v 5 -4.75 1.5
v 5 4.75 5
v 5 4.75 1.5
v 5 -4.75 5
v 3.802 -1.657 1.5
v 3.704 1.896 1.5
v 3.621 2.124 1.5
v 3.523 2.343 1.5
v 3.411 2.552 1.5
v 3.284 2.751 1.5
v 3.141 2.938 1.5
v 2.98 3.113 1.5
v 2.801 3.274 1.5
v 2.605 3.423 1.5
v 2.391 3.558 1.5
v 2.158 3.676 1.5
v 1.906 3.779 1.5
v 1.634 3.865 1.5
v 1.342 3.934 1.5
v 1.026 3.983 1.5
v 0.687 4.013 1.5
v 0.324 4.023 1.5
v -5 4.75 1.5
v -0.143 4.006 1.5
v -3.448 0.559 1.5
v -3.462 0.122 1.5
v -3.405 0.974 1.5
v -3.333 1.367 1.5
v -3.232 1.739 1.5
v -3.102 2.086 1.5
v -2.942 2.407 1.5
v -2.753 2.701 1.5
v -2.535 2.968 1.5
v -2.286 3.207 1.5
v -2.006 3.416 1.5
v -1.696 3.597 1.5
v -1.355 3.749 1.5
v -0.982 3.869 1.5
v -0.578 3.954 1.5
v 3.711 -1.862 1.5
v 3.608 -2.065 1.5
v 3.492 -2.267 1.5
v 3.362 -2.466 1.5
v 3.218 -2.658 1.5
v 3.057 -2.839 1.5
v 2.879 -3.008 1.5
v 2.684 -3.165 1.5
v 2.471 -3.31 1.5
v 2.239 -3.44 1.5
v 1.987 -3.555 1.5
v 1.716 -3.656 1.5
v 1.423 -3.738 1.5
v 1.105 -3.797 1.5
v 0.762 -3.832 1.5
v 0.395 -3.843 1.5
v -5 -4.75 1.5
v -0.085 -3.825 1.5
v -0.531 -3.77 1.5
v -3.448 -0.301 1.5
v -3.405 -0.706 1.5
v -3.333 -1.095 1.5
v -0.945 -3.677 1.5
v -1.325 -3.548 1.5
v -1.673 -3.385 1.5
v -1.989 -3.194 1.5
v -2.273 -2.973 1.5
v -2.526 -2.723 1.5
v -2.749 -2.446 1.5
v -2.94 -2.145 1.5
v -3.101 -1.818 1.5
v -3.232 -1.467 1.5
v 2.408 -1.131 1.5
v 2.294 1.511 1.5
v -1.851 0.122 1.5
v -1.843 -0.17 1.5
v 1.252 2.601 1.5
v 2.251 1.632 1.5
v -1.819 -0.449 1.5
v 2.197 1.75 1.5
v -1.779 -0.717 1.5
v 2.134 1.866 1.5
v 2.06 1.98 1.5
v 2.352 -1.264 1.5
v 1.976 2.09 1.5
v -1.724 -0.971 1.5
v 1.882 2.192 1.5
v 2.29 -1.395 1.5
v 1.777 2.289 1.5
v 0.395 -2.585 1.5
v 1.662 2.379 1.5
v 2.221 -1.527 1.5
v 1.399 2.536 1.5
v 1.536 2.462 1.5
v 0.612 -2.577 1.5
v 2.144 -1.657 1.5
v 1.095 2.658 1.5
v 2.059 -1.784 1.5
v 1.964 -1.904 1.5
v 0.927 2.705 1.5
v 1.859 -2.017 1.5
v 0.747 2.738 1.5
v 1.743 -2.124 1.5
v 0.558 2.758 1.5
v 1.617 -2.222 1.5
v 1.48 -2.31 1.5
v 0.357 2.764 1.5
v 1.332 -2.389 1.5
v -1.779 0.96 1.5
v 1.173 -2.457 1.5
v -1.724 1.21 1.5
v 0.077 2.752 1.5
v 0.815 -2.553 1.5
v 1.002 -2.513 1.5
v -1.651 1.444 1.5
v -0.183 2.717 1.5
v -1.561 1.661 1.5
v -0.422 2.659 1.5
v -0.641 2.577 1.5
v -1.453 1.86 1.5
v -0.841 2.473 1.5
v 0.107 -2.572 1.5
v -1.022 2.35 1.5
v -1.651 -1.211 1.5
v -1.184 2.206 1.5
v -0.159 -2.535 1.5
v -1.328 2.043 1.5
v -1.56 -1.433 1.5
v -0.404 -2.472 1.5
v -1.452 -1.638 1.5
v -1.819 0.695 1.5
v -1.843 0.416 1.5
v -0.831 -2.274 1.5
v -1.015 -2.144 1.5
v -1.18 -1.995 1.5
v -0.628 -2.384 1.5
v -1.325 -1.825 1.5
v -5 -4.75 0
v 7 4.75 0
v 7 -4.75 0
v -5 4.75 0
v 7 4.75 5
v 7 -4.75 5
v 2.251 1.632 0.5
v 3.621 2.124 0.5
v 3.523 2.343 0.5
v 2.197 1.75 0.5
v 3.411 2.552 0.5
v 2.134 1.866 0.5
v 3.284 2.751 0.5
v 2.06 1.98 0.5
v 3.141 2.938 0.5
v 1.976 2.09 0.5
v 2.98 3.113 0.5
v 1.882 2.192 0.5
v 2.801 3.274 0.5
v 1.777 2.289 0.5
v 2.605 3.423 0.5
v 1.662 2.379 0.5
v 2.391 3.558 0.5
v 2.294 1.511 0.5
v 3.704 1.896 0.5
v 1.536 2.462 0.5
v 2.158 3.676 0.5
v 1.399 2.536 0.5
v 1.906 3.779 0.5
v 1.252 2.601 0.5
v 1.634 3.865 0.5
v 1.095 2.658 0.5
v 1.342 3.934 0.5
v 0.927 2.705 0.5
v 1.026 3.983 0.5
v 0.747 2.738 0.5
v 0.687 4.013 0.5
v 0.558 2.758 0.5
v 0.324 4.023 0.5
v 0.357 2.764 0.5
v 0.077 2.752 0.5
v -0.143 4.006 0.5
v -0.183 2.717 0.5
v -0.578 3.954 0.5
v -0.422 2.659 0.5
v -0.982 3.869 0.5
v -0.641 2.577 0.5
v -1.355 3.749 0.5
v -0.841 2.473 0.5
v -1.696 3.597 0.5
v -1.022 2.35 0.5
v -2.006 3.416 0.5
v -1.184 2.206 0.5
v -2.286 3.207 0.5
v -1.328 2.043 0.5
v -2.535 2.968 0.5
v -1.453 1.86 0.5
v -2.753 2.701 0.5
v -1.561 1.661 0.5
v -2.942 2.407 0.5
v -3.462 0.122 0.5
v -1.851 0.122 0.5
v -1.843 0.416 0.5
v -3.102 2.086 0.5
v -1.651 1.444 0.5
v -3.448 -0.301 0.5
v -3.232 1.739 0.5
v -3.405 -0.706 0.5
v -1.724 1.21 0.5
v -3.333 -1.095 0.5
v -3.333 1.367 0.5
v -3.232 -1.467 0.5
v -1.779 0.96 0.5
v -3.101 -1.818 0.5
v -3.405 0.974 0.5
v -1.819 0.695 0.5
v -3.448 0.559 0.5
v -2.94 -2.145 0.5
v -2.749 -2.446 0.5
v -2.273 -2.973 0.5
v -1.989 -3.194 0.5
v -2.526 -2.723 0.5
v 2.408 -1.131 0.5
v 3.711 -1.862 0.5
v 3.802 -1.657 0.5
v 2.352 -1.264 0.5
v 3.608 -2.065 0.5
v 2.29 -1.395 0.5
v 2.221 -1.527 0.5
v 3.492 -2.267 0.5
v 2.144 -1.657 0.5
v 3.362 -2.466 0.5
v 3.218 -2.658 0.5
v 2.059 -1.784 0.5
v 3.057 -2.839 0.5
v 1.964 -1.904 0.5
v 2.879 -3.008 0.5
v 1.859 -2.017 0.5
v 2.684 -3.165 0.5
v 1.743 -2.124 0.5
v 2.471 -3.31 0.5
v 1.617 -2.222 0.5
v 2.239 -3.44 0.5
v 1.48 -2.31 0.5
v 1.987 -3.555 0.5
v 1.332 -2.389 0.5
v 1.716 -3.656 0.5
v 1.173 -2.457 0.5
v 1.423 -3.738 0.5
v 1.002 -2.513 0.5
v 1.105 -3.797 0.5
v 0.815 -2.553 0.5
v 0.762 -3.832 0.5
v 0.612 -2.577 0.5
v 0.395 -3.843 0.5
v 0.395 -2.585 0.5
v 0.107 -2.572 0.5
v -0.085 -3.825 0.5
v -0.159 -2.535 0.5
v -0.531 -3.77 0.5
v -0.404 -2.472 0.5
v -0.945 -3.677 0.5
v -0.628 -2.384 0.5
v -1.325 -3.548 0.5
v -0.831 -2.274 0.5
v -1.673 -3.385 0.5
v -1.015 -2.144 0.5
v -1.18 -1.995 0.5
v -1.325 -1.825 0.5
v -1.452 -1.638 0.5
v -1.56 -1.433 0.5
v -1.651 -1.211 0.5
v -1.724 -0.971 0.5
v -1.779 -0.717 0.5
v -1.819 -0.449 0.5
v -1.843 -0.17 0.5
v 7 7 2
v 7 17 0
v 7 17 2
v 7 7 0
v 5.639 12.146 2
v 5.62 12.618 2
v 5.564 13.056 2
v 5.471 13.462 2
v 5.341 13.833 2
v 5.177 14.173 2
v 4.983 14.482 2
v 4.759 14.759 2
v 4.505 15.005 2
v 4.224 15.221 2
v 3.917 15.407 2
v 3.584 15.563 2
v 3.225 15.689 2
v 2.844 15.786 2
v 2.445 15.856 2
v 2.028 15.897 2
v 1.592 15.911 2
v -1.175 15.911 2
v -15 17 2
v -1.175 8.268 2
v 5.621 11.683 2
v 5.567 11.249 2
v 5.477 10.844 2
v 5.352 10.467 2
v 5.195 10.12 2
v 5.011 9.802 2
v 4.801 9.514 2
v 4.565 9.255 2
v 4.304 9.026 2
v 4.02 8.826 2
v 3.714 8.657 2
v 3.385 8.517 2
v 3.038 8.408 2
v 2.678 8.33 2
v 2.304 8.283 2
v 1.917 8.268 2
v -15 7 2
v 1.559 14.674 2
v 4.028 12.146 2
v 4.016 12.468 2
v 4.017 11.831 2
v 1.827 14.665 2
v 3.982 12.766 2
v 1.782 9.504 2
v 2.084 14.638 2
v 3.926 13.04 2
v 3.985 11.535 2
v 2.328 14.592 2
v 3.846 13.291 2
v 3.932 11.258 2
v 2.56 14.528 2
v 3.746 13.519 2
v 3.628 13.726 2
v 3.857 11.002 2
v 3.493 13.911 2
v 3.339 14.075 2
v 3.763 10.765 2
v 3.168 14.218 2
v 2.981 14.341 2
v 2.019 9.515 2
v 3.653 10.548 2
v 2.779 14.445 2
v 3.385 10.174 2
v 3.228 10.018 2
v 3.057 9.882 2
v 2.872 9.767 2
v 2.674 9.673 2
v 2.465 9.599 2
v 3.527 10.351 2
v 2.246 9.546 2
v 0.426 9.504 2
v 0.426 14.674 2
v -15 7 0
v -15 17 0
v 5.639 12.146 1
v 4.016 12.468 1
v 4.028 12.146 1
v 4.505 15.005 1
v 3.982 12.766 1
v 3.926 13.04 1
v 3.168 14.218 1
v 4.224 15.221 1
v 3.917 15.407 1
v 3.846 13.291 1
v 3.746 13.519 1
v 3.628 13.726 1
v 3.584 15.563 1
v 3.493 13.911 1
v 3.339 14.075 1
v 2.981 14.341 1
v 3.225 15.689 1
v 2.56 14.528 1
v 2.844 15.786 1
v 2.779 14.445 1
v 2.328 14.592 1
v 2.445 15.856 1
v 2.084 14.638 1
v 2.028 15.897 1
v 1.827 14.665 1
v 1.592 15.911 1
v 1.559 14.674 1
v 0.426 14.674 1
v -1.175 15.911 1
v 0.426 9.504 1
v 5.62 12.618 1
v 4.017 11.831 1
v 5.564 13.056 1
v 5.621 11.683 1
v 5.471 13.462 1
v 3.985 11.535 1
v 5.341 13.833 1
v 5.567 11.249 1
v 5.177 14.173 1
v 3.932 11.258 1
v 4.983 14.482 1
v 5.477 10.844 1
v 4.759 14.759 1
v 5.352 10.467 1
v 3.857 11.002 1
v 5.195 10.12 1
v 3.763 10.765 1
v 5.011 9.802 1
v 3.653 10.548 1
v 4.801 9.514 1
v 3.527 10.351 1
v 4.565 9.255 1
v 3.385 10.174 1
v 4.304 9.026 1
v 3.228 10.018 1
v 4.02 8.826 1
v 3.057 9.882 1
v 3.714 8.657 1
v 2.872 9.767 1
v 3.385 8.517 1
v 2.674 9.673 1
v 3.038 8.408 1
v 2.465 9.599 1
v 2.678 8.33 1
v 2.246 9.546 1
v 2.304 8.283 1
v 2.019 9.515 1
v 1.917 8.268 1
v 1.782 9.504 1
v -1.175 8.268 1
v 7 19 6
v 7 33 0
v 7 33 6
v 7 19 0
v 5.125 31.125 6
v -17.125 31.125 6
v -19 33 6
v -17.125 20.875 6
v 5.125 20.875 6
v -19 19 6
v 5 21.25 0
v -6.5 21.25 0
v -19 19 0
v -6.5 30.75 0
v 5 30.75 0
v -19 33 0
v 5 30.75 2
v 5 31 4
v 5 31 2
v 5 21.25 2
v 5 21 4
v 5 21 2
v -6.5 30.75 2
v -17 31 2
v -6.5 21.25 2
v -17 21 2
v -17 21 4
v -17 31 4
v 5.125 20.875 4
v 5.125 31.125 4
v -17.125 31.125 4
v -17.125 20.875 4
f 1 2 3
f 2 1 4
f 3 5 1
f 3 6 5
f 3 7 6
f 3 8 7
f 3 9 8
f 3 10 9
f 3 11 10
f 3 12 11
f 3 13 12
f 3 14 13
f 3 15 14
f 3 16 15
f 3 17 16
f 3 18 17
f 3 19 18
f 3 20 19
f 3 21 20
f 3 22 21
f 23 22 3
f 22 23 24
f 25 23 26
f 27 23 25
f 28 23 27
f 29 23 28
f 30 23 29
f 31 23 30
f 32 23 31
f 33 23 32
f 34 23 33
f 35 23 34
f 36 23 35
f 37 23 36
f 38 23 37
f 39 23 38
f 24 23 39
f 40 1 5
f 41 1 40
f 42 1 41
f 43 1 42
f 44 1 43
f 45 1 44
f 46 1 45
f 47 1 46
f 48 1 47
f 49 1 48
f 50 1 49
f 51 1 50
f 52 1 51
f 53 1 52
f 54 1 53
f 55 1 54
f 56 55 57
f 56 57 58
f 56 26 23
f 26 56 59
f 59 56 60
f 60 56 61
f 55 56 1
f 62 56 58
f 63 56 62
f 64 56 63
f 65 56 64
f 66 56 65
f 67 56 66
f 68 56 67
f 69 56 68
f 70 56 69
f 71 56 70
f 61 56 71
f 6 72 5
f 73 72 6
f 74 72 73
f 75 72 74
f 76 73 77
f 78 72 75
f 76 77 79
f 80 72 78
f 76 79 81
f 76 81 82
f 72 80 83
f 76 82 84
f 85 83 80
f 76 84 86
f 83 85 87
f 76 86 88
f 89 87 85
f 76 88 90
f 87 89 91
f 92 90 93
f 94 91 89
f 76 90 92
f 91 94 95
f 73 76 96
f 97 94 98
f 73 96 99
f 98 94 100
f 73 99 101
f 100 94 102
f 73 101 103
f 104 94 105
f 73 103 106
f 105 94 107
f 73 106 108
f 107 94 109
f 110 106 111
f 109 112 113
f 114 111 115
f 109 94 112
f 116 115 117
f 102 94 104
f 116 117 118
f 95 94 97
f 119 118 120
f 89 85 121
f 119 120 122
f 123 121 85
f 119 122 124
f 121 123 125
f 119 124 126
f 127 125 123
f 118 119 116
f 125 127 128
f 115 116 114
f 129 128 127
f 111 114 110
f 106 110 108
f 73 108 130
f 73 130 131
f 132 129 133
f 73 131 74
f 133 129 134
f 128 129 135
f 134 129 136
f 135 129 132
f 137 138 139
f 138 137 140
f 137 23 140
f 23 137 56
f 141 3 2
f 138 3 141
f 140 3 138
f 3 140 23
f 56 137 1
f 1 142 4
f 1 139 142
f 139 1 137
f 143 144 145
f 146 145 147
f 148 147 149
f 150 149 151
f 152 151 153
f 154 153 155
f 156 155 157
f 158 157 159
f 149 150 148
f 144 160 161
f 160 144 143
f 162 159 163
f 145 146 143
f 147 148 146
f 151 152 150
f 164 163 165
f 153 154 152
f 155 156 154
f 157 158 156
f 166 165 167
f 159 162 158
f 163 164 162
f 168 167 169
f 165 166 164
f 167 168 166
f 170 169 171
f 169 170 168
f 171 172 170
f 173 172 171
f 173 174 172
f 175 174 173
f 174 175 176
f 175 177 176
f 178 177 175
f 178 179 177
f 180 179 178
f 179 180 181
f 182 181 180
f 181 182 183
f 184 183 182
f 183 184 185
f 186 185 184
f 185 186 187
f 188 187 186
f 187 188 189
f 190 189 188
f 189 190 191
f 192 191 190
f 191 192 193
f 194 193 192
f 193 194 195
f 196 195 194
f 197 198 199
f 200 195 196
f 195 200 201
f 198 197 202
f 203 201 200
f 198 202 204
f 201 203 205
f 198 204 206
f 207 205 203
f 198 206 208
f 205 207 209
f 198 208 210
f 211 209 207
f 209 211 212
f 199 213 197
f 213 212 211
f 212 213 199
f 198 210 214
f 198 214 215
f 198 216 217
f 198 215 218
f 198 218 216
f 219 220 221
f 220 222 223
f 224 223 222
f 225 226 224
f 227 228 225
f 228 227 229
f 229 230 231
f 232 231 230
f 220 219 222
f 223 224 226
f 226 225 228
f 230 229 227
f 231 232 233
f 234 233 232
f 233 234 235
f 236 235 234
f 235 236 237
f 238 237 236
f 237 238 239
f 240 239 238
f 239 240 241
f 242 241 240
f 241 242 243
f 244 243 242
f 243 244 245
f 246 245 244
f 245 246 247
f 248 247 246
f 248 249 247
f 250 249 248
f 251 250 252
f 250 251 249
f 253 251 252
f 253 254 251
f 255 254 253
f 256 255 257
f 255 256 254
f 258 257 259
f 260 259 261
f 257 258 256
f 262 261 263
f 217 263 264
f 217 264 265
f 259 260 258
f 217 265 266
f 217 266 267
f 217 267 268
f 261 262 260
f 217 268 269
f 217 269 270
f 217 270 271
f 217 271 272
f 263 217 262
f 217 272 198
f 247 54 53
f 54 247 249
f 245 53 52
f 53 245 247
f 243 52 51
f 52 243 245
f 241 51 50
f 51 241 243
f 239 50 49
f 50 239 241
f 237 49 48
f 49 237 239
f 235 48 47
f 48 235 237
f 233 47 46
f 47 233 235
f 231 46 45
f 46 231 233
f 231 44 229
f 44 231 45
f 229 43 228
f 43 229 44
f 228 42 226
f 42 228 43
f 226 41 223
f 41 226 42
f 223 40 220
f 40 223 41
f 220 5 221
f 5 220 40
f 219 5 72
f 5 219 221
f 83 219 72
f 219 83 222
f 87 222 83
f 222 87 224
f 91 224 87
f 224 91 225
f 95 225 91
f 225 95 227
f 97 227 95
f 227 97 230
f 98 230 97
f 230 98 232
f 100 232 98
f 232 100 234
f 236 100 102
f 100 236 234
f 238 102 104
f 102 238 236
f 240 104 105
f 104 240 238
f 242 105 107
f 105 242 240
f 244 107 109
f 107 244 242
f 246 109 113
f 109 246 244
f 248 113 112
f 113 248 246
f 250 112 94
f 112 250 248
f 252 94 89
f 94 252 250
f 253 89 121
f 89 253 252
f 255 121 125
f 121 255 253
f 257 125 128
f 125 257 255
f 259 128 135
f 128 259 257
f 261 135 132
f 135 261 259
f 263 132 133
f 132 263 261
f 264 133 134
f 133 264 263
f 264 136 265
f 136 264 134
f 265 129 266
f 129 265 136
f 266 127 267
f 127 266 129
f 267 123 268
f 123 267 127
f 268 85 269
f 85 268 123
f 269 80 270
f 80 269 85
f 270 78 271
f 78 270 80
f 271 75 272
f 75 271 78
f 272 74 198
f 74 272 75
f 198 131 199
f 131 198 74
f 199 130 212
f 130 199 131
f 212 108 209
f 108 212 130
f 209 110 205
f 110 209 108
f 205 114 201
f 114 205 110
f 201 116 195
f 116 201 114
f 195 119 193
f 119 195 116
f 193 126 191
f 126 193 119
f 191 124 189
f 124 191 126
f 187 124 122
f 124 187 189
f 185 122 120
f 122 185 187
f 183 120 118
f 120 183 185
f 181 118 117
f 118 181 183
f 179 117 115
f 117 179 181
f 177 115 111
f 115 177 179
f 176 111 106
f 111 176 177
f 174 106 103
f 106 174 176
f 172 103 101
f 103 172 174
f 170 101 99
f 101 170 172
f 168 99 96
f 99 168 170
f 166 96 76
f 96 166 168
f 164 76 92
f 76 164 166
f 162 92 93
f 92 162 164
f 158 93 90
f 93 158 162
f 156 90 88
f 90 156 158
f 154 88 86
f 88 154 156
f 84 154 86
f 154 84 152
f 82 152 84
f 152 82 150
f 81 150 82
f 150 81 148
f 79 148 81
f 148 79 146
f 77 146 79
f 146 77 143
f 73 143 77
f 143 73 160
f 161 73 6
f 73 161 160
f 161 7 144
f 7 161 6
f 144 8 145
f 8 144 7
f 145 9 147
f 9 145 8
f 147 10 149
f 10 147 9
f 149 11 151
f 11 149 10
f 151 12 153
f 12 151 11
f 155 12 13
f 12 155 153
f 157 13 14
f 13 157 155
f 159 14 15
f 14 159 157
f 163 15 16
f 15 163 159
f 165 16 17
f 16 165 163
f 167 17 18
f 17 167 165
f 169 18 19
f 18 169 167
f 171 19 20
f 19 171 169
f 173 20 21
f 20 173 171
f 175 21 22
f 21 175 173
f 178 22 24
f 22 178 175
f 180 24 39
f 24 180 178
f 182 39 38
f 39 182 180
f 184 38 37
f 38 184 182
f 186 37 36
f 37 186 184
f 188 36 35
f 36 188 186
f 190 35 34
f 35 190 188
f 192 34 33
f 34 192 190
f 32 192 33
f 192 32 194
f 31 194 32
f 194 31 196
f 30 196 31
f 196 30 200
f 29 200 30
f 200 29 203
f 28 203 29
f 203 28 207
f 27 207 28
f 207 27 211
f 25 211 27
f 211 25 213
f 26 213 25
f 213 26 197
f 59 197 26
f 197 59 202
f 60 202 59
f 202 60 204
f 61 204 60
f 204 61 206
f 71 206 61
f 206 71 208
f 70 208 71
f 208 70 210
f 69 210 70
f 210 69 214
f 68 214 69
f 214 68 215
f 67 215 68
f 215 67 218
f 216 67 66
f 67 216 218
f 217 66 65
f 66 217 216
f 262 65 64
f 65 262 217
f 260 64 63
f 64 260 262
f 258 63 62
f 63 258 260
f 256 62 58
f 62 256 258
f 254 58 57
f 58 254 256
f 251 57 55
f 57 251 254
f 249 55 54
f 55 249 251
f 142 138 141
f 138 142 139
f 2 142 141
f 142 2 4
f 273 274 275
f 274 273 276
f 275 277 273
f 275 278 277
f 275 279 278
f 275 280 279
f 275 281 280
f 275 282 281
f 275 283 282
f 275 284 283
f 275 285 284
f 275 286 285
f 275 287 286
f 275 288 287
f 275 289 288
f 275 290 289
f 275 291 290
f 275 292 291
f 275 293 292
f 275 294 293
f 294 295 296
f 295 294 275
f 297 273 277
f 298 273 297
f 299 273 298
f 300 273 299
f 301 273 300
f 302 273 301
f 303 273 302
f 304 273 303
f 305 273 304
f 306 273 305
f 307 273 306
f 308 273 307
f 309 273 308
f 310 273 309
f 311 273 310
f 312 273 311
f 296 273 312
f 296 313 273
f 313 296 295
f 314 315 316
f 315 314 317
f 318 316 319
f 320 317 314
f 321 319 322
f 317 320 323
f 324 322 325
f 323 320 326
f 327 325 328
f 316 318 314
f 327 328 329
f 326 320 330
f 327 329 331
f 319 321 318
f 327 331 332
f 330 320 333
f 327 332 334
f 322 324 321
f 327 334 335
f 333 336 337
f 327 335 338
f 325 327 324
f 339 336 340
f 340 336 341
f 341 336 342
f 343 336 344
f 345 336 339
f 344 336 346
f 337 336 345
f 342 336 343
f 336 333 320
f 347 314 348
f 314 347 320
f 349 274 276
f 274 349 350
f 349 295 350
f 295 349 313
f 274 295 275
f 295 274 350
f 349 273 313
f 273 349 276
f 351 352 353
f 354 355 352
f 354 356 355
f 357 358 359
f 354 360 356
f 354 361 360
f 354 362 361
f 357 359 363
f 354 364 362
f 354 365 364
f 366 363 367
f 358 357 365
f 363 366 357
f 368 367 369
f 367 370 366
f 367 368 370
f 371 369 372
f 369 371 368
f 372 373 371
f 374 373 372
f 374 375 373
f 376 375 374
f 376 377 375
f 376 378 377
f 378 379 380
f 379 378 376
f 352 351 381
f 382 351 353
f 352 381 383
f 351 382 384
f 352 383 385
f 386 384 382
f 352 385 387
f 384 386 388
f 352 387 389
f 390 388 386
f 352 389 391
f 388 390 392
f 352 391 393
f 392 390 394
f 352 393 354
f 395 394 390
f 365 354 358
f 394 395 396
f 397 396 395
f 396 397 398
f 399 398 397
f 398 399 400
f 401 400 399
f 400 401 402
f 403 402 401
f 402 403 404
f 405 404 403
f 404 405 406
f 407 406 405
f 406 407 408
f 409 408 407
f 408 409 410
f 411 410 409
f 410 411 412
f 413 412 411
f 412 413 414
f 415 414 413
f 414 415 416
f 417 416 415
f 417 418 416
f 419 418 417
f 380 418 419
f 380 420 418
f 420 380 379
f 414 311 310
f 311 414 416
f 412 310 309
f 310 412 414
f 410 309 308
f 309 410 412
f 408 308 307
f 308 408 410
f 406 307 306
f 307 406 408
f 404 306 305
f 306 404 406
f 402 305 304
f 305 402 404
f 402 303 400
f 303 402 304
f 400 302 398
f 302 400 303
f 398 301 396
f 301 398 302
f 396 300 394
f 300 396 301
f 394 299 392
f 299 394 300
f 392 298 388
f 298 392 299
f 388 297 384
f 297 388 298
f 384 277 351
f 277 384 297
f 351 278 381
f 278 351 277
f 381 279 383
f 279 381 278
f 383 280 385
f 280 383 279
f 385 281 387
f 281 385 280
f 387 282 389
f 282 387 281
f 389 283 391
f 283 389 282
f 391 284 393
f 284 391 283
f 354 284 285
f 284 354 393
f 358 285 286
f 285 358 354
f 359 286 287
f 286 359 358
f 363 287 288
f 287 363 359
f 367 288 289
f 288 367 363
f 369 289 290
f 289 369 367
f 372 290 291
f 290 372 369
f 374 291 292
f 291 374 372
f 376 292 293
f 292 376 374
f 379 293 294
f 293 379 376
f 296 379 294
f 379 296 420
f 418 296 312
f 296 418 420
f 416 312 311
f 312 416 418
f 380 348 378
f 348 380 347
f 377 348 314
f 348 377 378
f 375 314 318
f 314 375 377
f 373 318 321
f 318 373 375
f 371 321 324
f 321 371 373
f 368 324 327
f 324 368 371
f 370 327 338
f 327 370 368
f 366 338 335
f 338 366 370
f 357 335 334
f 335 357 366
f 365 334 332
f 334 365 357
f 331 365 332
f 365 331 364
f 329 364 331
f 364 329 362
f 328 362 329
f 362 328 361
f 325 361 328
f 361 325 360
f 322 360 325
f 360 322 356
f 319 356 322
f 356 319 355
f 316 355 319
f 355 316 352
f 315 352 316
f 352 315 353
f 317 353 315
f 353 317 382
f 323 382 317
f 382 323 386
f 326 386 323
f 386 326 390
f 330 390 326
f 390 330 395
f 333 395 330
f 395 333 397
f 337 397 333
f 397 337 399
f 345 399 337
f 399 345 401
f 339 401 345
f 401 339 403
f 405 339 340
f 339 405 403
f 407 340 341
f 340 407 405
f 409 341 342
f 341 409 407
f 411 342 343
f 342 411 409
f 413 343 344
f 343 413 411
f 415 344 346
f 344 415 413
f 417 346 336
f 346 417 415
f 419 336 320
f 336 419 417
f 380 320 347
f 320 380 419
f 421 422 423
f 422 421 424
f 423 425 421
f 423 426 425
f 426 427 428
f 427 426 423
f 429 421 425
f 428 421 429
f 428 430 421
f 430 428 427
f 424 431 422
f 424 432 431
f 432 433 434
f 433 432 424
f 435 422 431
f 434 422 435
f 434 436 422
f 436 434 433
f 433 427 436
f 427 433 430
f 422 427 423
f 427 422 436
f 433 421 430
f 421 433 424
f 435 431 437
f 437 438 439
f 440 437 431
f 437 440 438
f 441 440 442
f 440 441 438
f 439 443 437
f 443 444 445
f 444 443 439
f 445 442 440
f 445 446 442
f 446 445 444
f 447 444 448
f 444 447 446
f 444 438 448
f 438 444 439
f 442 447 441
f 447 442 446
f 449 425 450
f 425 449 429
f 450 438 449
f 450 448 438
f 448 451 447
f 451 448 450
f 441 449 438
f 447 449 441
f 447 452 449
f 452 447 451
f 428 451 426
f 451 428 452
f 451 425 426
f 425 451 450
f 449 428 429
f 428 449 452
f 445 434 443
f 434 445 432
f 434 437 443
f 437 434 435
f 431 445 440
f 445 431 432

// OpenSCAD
//length of green slide, not counting pull handle thickness
s=10;   
//thickness (of walls, pull handle, etc.)
t=2;  
//delta - additional tolerance space between pieces for better snap and slide
d=0.25; 
//Letter for green/good slide. 
good="C";   
//Letter for red/dirty back
bad="D";    
//Font - include styles as desired. 
ff="Liberation Sans:style=Bold";  
//font size - same as or slightly smaller than 's', depending on font
fs=8;  

color("green") {
    difference() {
        translate([-(s/2),-s/2+d]) cube(size=[s,s-2*d,t-2*d],center=false);
        translate([0,0,t/2-2*d]) linear_extrude(height=t/2) text(good, font=ff, size=fs, valign="center", halign="center");
    }
    translate([s/2,-s/2+d,0]) cube(size=[t,s-2*d,2*t+1],center=false);
}

color("red") {
    difference() {
        translate([-(3*s/2),s/2+t,0]) cube(size=[2*s+t,s,t],center=false);
        translate([t,s+t,t/2]) linear_extrude(height=t/2) text(bad, font=ff, size=fs, valign="center", halign="center");
    }
}

color("white") {
    difference() {
        translate([-(3*s/2+2*t),(3*s/2+2*t),0]) cube(size=[2*s+3*t,s+2*t,3*t],center=false);
        translate([-(3*s/2+t),(3*s/2)+3*t,t]) cube(size=[2*s+t,s,2*t],center=false);
        translate([-(3*s/2+t+d/2),(3*s/2)+3*t-d/2,2*t]) cube(size=[2*s+t+d,s+d,2*t],center=false);
        translate([-s/2-t+2*d,3*s/2+3*t+d,0]) cube(size=[s+t-2*d,s-2*d,t],center=false);
    }
}
